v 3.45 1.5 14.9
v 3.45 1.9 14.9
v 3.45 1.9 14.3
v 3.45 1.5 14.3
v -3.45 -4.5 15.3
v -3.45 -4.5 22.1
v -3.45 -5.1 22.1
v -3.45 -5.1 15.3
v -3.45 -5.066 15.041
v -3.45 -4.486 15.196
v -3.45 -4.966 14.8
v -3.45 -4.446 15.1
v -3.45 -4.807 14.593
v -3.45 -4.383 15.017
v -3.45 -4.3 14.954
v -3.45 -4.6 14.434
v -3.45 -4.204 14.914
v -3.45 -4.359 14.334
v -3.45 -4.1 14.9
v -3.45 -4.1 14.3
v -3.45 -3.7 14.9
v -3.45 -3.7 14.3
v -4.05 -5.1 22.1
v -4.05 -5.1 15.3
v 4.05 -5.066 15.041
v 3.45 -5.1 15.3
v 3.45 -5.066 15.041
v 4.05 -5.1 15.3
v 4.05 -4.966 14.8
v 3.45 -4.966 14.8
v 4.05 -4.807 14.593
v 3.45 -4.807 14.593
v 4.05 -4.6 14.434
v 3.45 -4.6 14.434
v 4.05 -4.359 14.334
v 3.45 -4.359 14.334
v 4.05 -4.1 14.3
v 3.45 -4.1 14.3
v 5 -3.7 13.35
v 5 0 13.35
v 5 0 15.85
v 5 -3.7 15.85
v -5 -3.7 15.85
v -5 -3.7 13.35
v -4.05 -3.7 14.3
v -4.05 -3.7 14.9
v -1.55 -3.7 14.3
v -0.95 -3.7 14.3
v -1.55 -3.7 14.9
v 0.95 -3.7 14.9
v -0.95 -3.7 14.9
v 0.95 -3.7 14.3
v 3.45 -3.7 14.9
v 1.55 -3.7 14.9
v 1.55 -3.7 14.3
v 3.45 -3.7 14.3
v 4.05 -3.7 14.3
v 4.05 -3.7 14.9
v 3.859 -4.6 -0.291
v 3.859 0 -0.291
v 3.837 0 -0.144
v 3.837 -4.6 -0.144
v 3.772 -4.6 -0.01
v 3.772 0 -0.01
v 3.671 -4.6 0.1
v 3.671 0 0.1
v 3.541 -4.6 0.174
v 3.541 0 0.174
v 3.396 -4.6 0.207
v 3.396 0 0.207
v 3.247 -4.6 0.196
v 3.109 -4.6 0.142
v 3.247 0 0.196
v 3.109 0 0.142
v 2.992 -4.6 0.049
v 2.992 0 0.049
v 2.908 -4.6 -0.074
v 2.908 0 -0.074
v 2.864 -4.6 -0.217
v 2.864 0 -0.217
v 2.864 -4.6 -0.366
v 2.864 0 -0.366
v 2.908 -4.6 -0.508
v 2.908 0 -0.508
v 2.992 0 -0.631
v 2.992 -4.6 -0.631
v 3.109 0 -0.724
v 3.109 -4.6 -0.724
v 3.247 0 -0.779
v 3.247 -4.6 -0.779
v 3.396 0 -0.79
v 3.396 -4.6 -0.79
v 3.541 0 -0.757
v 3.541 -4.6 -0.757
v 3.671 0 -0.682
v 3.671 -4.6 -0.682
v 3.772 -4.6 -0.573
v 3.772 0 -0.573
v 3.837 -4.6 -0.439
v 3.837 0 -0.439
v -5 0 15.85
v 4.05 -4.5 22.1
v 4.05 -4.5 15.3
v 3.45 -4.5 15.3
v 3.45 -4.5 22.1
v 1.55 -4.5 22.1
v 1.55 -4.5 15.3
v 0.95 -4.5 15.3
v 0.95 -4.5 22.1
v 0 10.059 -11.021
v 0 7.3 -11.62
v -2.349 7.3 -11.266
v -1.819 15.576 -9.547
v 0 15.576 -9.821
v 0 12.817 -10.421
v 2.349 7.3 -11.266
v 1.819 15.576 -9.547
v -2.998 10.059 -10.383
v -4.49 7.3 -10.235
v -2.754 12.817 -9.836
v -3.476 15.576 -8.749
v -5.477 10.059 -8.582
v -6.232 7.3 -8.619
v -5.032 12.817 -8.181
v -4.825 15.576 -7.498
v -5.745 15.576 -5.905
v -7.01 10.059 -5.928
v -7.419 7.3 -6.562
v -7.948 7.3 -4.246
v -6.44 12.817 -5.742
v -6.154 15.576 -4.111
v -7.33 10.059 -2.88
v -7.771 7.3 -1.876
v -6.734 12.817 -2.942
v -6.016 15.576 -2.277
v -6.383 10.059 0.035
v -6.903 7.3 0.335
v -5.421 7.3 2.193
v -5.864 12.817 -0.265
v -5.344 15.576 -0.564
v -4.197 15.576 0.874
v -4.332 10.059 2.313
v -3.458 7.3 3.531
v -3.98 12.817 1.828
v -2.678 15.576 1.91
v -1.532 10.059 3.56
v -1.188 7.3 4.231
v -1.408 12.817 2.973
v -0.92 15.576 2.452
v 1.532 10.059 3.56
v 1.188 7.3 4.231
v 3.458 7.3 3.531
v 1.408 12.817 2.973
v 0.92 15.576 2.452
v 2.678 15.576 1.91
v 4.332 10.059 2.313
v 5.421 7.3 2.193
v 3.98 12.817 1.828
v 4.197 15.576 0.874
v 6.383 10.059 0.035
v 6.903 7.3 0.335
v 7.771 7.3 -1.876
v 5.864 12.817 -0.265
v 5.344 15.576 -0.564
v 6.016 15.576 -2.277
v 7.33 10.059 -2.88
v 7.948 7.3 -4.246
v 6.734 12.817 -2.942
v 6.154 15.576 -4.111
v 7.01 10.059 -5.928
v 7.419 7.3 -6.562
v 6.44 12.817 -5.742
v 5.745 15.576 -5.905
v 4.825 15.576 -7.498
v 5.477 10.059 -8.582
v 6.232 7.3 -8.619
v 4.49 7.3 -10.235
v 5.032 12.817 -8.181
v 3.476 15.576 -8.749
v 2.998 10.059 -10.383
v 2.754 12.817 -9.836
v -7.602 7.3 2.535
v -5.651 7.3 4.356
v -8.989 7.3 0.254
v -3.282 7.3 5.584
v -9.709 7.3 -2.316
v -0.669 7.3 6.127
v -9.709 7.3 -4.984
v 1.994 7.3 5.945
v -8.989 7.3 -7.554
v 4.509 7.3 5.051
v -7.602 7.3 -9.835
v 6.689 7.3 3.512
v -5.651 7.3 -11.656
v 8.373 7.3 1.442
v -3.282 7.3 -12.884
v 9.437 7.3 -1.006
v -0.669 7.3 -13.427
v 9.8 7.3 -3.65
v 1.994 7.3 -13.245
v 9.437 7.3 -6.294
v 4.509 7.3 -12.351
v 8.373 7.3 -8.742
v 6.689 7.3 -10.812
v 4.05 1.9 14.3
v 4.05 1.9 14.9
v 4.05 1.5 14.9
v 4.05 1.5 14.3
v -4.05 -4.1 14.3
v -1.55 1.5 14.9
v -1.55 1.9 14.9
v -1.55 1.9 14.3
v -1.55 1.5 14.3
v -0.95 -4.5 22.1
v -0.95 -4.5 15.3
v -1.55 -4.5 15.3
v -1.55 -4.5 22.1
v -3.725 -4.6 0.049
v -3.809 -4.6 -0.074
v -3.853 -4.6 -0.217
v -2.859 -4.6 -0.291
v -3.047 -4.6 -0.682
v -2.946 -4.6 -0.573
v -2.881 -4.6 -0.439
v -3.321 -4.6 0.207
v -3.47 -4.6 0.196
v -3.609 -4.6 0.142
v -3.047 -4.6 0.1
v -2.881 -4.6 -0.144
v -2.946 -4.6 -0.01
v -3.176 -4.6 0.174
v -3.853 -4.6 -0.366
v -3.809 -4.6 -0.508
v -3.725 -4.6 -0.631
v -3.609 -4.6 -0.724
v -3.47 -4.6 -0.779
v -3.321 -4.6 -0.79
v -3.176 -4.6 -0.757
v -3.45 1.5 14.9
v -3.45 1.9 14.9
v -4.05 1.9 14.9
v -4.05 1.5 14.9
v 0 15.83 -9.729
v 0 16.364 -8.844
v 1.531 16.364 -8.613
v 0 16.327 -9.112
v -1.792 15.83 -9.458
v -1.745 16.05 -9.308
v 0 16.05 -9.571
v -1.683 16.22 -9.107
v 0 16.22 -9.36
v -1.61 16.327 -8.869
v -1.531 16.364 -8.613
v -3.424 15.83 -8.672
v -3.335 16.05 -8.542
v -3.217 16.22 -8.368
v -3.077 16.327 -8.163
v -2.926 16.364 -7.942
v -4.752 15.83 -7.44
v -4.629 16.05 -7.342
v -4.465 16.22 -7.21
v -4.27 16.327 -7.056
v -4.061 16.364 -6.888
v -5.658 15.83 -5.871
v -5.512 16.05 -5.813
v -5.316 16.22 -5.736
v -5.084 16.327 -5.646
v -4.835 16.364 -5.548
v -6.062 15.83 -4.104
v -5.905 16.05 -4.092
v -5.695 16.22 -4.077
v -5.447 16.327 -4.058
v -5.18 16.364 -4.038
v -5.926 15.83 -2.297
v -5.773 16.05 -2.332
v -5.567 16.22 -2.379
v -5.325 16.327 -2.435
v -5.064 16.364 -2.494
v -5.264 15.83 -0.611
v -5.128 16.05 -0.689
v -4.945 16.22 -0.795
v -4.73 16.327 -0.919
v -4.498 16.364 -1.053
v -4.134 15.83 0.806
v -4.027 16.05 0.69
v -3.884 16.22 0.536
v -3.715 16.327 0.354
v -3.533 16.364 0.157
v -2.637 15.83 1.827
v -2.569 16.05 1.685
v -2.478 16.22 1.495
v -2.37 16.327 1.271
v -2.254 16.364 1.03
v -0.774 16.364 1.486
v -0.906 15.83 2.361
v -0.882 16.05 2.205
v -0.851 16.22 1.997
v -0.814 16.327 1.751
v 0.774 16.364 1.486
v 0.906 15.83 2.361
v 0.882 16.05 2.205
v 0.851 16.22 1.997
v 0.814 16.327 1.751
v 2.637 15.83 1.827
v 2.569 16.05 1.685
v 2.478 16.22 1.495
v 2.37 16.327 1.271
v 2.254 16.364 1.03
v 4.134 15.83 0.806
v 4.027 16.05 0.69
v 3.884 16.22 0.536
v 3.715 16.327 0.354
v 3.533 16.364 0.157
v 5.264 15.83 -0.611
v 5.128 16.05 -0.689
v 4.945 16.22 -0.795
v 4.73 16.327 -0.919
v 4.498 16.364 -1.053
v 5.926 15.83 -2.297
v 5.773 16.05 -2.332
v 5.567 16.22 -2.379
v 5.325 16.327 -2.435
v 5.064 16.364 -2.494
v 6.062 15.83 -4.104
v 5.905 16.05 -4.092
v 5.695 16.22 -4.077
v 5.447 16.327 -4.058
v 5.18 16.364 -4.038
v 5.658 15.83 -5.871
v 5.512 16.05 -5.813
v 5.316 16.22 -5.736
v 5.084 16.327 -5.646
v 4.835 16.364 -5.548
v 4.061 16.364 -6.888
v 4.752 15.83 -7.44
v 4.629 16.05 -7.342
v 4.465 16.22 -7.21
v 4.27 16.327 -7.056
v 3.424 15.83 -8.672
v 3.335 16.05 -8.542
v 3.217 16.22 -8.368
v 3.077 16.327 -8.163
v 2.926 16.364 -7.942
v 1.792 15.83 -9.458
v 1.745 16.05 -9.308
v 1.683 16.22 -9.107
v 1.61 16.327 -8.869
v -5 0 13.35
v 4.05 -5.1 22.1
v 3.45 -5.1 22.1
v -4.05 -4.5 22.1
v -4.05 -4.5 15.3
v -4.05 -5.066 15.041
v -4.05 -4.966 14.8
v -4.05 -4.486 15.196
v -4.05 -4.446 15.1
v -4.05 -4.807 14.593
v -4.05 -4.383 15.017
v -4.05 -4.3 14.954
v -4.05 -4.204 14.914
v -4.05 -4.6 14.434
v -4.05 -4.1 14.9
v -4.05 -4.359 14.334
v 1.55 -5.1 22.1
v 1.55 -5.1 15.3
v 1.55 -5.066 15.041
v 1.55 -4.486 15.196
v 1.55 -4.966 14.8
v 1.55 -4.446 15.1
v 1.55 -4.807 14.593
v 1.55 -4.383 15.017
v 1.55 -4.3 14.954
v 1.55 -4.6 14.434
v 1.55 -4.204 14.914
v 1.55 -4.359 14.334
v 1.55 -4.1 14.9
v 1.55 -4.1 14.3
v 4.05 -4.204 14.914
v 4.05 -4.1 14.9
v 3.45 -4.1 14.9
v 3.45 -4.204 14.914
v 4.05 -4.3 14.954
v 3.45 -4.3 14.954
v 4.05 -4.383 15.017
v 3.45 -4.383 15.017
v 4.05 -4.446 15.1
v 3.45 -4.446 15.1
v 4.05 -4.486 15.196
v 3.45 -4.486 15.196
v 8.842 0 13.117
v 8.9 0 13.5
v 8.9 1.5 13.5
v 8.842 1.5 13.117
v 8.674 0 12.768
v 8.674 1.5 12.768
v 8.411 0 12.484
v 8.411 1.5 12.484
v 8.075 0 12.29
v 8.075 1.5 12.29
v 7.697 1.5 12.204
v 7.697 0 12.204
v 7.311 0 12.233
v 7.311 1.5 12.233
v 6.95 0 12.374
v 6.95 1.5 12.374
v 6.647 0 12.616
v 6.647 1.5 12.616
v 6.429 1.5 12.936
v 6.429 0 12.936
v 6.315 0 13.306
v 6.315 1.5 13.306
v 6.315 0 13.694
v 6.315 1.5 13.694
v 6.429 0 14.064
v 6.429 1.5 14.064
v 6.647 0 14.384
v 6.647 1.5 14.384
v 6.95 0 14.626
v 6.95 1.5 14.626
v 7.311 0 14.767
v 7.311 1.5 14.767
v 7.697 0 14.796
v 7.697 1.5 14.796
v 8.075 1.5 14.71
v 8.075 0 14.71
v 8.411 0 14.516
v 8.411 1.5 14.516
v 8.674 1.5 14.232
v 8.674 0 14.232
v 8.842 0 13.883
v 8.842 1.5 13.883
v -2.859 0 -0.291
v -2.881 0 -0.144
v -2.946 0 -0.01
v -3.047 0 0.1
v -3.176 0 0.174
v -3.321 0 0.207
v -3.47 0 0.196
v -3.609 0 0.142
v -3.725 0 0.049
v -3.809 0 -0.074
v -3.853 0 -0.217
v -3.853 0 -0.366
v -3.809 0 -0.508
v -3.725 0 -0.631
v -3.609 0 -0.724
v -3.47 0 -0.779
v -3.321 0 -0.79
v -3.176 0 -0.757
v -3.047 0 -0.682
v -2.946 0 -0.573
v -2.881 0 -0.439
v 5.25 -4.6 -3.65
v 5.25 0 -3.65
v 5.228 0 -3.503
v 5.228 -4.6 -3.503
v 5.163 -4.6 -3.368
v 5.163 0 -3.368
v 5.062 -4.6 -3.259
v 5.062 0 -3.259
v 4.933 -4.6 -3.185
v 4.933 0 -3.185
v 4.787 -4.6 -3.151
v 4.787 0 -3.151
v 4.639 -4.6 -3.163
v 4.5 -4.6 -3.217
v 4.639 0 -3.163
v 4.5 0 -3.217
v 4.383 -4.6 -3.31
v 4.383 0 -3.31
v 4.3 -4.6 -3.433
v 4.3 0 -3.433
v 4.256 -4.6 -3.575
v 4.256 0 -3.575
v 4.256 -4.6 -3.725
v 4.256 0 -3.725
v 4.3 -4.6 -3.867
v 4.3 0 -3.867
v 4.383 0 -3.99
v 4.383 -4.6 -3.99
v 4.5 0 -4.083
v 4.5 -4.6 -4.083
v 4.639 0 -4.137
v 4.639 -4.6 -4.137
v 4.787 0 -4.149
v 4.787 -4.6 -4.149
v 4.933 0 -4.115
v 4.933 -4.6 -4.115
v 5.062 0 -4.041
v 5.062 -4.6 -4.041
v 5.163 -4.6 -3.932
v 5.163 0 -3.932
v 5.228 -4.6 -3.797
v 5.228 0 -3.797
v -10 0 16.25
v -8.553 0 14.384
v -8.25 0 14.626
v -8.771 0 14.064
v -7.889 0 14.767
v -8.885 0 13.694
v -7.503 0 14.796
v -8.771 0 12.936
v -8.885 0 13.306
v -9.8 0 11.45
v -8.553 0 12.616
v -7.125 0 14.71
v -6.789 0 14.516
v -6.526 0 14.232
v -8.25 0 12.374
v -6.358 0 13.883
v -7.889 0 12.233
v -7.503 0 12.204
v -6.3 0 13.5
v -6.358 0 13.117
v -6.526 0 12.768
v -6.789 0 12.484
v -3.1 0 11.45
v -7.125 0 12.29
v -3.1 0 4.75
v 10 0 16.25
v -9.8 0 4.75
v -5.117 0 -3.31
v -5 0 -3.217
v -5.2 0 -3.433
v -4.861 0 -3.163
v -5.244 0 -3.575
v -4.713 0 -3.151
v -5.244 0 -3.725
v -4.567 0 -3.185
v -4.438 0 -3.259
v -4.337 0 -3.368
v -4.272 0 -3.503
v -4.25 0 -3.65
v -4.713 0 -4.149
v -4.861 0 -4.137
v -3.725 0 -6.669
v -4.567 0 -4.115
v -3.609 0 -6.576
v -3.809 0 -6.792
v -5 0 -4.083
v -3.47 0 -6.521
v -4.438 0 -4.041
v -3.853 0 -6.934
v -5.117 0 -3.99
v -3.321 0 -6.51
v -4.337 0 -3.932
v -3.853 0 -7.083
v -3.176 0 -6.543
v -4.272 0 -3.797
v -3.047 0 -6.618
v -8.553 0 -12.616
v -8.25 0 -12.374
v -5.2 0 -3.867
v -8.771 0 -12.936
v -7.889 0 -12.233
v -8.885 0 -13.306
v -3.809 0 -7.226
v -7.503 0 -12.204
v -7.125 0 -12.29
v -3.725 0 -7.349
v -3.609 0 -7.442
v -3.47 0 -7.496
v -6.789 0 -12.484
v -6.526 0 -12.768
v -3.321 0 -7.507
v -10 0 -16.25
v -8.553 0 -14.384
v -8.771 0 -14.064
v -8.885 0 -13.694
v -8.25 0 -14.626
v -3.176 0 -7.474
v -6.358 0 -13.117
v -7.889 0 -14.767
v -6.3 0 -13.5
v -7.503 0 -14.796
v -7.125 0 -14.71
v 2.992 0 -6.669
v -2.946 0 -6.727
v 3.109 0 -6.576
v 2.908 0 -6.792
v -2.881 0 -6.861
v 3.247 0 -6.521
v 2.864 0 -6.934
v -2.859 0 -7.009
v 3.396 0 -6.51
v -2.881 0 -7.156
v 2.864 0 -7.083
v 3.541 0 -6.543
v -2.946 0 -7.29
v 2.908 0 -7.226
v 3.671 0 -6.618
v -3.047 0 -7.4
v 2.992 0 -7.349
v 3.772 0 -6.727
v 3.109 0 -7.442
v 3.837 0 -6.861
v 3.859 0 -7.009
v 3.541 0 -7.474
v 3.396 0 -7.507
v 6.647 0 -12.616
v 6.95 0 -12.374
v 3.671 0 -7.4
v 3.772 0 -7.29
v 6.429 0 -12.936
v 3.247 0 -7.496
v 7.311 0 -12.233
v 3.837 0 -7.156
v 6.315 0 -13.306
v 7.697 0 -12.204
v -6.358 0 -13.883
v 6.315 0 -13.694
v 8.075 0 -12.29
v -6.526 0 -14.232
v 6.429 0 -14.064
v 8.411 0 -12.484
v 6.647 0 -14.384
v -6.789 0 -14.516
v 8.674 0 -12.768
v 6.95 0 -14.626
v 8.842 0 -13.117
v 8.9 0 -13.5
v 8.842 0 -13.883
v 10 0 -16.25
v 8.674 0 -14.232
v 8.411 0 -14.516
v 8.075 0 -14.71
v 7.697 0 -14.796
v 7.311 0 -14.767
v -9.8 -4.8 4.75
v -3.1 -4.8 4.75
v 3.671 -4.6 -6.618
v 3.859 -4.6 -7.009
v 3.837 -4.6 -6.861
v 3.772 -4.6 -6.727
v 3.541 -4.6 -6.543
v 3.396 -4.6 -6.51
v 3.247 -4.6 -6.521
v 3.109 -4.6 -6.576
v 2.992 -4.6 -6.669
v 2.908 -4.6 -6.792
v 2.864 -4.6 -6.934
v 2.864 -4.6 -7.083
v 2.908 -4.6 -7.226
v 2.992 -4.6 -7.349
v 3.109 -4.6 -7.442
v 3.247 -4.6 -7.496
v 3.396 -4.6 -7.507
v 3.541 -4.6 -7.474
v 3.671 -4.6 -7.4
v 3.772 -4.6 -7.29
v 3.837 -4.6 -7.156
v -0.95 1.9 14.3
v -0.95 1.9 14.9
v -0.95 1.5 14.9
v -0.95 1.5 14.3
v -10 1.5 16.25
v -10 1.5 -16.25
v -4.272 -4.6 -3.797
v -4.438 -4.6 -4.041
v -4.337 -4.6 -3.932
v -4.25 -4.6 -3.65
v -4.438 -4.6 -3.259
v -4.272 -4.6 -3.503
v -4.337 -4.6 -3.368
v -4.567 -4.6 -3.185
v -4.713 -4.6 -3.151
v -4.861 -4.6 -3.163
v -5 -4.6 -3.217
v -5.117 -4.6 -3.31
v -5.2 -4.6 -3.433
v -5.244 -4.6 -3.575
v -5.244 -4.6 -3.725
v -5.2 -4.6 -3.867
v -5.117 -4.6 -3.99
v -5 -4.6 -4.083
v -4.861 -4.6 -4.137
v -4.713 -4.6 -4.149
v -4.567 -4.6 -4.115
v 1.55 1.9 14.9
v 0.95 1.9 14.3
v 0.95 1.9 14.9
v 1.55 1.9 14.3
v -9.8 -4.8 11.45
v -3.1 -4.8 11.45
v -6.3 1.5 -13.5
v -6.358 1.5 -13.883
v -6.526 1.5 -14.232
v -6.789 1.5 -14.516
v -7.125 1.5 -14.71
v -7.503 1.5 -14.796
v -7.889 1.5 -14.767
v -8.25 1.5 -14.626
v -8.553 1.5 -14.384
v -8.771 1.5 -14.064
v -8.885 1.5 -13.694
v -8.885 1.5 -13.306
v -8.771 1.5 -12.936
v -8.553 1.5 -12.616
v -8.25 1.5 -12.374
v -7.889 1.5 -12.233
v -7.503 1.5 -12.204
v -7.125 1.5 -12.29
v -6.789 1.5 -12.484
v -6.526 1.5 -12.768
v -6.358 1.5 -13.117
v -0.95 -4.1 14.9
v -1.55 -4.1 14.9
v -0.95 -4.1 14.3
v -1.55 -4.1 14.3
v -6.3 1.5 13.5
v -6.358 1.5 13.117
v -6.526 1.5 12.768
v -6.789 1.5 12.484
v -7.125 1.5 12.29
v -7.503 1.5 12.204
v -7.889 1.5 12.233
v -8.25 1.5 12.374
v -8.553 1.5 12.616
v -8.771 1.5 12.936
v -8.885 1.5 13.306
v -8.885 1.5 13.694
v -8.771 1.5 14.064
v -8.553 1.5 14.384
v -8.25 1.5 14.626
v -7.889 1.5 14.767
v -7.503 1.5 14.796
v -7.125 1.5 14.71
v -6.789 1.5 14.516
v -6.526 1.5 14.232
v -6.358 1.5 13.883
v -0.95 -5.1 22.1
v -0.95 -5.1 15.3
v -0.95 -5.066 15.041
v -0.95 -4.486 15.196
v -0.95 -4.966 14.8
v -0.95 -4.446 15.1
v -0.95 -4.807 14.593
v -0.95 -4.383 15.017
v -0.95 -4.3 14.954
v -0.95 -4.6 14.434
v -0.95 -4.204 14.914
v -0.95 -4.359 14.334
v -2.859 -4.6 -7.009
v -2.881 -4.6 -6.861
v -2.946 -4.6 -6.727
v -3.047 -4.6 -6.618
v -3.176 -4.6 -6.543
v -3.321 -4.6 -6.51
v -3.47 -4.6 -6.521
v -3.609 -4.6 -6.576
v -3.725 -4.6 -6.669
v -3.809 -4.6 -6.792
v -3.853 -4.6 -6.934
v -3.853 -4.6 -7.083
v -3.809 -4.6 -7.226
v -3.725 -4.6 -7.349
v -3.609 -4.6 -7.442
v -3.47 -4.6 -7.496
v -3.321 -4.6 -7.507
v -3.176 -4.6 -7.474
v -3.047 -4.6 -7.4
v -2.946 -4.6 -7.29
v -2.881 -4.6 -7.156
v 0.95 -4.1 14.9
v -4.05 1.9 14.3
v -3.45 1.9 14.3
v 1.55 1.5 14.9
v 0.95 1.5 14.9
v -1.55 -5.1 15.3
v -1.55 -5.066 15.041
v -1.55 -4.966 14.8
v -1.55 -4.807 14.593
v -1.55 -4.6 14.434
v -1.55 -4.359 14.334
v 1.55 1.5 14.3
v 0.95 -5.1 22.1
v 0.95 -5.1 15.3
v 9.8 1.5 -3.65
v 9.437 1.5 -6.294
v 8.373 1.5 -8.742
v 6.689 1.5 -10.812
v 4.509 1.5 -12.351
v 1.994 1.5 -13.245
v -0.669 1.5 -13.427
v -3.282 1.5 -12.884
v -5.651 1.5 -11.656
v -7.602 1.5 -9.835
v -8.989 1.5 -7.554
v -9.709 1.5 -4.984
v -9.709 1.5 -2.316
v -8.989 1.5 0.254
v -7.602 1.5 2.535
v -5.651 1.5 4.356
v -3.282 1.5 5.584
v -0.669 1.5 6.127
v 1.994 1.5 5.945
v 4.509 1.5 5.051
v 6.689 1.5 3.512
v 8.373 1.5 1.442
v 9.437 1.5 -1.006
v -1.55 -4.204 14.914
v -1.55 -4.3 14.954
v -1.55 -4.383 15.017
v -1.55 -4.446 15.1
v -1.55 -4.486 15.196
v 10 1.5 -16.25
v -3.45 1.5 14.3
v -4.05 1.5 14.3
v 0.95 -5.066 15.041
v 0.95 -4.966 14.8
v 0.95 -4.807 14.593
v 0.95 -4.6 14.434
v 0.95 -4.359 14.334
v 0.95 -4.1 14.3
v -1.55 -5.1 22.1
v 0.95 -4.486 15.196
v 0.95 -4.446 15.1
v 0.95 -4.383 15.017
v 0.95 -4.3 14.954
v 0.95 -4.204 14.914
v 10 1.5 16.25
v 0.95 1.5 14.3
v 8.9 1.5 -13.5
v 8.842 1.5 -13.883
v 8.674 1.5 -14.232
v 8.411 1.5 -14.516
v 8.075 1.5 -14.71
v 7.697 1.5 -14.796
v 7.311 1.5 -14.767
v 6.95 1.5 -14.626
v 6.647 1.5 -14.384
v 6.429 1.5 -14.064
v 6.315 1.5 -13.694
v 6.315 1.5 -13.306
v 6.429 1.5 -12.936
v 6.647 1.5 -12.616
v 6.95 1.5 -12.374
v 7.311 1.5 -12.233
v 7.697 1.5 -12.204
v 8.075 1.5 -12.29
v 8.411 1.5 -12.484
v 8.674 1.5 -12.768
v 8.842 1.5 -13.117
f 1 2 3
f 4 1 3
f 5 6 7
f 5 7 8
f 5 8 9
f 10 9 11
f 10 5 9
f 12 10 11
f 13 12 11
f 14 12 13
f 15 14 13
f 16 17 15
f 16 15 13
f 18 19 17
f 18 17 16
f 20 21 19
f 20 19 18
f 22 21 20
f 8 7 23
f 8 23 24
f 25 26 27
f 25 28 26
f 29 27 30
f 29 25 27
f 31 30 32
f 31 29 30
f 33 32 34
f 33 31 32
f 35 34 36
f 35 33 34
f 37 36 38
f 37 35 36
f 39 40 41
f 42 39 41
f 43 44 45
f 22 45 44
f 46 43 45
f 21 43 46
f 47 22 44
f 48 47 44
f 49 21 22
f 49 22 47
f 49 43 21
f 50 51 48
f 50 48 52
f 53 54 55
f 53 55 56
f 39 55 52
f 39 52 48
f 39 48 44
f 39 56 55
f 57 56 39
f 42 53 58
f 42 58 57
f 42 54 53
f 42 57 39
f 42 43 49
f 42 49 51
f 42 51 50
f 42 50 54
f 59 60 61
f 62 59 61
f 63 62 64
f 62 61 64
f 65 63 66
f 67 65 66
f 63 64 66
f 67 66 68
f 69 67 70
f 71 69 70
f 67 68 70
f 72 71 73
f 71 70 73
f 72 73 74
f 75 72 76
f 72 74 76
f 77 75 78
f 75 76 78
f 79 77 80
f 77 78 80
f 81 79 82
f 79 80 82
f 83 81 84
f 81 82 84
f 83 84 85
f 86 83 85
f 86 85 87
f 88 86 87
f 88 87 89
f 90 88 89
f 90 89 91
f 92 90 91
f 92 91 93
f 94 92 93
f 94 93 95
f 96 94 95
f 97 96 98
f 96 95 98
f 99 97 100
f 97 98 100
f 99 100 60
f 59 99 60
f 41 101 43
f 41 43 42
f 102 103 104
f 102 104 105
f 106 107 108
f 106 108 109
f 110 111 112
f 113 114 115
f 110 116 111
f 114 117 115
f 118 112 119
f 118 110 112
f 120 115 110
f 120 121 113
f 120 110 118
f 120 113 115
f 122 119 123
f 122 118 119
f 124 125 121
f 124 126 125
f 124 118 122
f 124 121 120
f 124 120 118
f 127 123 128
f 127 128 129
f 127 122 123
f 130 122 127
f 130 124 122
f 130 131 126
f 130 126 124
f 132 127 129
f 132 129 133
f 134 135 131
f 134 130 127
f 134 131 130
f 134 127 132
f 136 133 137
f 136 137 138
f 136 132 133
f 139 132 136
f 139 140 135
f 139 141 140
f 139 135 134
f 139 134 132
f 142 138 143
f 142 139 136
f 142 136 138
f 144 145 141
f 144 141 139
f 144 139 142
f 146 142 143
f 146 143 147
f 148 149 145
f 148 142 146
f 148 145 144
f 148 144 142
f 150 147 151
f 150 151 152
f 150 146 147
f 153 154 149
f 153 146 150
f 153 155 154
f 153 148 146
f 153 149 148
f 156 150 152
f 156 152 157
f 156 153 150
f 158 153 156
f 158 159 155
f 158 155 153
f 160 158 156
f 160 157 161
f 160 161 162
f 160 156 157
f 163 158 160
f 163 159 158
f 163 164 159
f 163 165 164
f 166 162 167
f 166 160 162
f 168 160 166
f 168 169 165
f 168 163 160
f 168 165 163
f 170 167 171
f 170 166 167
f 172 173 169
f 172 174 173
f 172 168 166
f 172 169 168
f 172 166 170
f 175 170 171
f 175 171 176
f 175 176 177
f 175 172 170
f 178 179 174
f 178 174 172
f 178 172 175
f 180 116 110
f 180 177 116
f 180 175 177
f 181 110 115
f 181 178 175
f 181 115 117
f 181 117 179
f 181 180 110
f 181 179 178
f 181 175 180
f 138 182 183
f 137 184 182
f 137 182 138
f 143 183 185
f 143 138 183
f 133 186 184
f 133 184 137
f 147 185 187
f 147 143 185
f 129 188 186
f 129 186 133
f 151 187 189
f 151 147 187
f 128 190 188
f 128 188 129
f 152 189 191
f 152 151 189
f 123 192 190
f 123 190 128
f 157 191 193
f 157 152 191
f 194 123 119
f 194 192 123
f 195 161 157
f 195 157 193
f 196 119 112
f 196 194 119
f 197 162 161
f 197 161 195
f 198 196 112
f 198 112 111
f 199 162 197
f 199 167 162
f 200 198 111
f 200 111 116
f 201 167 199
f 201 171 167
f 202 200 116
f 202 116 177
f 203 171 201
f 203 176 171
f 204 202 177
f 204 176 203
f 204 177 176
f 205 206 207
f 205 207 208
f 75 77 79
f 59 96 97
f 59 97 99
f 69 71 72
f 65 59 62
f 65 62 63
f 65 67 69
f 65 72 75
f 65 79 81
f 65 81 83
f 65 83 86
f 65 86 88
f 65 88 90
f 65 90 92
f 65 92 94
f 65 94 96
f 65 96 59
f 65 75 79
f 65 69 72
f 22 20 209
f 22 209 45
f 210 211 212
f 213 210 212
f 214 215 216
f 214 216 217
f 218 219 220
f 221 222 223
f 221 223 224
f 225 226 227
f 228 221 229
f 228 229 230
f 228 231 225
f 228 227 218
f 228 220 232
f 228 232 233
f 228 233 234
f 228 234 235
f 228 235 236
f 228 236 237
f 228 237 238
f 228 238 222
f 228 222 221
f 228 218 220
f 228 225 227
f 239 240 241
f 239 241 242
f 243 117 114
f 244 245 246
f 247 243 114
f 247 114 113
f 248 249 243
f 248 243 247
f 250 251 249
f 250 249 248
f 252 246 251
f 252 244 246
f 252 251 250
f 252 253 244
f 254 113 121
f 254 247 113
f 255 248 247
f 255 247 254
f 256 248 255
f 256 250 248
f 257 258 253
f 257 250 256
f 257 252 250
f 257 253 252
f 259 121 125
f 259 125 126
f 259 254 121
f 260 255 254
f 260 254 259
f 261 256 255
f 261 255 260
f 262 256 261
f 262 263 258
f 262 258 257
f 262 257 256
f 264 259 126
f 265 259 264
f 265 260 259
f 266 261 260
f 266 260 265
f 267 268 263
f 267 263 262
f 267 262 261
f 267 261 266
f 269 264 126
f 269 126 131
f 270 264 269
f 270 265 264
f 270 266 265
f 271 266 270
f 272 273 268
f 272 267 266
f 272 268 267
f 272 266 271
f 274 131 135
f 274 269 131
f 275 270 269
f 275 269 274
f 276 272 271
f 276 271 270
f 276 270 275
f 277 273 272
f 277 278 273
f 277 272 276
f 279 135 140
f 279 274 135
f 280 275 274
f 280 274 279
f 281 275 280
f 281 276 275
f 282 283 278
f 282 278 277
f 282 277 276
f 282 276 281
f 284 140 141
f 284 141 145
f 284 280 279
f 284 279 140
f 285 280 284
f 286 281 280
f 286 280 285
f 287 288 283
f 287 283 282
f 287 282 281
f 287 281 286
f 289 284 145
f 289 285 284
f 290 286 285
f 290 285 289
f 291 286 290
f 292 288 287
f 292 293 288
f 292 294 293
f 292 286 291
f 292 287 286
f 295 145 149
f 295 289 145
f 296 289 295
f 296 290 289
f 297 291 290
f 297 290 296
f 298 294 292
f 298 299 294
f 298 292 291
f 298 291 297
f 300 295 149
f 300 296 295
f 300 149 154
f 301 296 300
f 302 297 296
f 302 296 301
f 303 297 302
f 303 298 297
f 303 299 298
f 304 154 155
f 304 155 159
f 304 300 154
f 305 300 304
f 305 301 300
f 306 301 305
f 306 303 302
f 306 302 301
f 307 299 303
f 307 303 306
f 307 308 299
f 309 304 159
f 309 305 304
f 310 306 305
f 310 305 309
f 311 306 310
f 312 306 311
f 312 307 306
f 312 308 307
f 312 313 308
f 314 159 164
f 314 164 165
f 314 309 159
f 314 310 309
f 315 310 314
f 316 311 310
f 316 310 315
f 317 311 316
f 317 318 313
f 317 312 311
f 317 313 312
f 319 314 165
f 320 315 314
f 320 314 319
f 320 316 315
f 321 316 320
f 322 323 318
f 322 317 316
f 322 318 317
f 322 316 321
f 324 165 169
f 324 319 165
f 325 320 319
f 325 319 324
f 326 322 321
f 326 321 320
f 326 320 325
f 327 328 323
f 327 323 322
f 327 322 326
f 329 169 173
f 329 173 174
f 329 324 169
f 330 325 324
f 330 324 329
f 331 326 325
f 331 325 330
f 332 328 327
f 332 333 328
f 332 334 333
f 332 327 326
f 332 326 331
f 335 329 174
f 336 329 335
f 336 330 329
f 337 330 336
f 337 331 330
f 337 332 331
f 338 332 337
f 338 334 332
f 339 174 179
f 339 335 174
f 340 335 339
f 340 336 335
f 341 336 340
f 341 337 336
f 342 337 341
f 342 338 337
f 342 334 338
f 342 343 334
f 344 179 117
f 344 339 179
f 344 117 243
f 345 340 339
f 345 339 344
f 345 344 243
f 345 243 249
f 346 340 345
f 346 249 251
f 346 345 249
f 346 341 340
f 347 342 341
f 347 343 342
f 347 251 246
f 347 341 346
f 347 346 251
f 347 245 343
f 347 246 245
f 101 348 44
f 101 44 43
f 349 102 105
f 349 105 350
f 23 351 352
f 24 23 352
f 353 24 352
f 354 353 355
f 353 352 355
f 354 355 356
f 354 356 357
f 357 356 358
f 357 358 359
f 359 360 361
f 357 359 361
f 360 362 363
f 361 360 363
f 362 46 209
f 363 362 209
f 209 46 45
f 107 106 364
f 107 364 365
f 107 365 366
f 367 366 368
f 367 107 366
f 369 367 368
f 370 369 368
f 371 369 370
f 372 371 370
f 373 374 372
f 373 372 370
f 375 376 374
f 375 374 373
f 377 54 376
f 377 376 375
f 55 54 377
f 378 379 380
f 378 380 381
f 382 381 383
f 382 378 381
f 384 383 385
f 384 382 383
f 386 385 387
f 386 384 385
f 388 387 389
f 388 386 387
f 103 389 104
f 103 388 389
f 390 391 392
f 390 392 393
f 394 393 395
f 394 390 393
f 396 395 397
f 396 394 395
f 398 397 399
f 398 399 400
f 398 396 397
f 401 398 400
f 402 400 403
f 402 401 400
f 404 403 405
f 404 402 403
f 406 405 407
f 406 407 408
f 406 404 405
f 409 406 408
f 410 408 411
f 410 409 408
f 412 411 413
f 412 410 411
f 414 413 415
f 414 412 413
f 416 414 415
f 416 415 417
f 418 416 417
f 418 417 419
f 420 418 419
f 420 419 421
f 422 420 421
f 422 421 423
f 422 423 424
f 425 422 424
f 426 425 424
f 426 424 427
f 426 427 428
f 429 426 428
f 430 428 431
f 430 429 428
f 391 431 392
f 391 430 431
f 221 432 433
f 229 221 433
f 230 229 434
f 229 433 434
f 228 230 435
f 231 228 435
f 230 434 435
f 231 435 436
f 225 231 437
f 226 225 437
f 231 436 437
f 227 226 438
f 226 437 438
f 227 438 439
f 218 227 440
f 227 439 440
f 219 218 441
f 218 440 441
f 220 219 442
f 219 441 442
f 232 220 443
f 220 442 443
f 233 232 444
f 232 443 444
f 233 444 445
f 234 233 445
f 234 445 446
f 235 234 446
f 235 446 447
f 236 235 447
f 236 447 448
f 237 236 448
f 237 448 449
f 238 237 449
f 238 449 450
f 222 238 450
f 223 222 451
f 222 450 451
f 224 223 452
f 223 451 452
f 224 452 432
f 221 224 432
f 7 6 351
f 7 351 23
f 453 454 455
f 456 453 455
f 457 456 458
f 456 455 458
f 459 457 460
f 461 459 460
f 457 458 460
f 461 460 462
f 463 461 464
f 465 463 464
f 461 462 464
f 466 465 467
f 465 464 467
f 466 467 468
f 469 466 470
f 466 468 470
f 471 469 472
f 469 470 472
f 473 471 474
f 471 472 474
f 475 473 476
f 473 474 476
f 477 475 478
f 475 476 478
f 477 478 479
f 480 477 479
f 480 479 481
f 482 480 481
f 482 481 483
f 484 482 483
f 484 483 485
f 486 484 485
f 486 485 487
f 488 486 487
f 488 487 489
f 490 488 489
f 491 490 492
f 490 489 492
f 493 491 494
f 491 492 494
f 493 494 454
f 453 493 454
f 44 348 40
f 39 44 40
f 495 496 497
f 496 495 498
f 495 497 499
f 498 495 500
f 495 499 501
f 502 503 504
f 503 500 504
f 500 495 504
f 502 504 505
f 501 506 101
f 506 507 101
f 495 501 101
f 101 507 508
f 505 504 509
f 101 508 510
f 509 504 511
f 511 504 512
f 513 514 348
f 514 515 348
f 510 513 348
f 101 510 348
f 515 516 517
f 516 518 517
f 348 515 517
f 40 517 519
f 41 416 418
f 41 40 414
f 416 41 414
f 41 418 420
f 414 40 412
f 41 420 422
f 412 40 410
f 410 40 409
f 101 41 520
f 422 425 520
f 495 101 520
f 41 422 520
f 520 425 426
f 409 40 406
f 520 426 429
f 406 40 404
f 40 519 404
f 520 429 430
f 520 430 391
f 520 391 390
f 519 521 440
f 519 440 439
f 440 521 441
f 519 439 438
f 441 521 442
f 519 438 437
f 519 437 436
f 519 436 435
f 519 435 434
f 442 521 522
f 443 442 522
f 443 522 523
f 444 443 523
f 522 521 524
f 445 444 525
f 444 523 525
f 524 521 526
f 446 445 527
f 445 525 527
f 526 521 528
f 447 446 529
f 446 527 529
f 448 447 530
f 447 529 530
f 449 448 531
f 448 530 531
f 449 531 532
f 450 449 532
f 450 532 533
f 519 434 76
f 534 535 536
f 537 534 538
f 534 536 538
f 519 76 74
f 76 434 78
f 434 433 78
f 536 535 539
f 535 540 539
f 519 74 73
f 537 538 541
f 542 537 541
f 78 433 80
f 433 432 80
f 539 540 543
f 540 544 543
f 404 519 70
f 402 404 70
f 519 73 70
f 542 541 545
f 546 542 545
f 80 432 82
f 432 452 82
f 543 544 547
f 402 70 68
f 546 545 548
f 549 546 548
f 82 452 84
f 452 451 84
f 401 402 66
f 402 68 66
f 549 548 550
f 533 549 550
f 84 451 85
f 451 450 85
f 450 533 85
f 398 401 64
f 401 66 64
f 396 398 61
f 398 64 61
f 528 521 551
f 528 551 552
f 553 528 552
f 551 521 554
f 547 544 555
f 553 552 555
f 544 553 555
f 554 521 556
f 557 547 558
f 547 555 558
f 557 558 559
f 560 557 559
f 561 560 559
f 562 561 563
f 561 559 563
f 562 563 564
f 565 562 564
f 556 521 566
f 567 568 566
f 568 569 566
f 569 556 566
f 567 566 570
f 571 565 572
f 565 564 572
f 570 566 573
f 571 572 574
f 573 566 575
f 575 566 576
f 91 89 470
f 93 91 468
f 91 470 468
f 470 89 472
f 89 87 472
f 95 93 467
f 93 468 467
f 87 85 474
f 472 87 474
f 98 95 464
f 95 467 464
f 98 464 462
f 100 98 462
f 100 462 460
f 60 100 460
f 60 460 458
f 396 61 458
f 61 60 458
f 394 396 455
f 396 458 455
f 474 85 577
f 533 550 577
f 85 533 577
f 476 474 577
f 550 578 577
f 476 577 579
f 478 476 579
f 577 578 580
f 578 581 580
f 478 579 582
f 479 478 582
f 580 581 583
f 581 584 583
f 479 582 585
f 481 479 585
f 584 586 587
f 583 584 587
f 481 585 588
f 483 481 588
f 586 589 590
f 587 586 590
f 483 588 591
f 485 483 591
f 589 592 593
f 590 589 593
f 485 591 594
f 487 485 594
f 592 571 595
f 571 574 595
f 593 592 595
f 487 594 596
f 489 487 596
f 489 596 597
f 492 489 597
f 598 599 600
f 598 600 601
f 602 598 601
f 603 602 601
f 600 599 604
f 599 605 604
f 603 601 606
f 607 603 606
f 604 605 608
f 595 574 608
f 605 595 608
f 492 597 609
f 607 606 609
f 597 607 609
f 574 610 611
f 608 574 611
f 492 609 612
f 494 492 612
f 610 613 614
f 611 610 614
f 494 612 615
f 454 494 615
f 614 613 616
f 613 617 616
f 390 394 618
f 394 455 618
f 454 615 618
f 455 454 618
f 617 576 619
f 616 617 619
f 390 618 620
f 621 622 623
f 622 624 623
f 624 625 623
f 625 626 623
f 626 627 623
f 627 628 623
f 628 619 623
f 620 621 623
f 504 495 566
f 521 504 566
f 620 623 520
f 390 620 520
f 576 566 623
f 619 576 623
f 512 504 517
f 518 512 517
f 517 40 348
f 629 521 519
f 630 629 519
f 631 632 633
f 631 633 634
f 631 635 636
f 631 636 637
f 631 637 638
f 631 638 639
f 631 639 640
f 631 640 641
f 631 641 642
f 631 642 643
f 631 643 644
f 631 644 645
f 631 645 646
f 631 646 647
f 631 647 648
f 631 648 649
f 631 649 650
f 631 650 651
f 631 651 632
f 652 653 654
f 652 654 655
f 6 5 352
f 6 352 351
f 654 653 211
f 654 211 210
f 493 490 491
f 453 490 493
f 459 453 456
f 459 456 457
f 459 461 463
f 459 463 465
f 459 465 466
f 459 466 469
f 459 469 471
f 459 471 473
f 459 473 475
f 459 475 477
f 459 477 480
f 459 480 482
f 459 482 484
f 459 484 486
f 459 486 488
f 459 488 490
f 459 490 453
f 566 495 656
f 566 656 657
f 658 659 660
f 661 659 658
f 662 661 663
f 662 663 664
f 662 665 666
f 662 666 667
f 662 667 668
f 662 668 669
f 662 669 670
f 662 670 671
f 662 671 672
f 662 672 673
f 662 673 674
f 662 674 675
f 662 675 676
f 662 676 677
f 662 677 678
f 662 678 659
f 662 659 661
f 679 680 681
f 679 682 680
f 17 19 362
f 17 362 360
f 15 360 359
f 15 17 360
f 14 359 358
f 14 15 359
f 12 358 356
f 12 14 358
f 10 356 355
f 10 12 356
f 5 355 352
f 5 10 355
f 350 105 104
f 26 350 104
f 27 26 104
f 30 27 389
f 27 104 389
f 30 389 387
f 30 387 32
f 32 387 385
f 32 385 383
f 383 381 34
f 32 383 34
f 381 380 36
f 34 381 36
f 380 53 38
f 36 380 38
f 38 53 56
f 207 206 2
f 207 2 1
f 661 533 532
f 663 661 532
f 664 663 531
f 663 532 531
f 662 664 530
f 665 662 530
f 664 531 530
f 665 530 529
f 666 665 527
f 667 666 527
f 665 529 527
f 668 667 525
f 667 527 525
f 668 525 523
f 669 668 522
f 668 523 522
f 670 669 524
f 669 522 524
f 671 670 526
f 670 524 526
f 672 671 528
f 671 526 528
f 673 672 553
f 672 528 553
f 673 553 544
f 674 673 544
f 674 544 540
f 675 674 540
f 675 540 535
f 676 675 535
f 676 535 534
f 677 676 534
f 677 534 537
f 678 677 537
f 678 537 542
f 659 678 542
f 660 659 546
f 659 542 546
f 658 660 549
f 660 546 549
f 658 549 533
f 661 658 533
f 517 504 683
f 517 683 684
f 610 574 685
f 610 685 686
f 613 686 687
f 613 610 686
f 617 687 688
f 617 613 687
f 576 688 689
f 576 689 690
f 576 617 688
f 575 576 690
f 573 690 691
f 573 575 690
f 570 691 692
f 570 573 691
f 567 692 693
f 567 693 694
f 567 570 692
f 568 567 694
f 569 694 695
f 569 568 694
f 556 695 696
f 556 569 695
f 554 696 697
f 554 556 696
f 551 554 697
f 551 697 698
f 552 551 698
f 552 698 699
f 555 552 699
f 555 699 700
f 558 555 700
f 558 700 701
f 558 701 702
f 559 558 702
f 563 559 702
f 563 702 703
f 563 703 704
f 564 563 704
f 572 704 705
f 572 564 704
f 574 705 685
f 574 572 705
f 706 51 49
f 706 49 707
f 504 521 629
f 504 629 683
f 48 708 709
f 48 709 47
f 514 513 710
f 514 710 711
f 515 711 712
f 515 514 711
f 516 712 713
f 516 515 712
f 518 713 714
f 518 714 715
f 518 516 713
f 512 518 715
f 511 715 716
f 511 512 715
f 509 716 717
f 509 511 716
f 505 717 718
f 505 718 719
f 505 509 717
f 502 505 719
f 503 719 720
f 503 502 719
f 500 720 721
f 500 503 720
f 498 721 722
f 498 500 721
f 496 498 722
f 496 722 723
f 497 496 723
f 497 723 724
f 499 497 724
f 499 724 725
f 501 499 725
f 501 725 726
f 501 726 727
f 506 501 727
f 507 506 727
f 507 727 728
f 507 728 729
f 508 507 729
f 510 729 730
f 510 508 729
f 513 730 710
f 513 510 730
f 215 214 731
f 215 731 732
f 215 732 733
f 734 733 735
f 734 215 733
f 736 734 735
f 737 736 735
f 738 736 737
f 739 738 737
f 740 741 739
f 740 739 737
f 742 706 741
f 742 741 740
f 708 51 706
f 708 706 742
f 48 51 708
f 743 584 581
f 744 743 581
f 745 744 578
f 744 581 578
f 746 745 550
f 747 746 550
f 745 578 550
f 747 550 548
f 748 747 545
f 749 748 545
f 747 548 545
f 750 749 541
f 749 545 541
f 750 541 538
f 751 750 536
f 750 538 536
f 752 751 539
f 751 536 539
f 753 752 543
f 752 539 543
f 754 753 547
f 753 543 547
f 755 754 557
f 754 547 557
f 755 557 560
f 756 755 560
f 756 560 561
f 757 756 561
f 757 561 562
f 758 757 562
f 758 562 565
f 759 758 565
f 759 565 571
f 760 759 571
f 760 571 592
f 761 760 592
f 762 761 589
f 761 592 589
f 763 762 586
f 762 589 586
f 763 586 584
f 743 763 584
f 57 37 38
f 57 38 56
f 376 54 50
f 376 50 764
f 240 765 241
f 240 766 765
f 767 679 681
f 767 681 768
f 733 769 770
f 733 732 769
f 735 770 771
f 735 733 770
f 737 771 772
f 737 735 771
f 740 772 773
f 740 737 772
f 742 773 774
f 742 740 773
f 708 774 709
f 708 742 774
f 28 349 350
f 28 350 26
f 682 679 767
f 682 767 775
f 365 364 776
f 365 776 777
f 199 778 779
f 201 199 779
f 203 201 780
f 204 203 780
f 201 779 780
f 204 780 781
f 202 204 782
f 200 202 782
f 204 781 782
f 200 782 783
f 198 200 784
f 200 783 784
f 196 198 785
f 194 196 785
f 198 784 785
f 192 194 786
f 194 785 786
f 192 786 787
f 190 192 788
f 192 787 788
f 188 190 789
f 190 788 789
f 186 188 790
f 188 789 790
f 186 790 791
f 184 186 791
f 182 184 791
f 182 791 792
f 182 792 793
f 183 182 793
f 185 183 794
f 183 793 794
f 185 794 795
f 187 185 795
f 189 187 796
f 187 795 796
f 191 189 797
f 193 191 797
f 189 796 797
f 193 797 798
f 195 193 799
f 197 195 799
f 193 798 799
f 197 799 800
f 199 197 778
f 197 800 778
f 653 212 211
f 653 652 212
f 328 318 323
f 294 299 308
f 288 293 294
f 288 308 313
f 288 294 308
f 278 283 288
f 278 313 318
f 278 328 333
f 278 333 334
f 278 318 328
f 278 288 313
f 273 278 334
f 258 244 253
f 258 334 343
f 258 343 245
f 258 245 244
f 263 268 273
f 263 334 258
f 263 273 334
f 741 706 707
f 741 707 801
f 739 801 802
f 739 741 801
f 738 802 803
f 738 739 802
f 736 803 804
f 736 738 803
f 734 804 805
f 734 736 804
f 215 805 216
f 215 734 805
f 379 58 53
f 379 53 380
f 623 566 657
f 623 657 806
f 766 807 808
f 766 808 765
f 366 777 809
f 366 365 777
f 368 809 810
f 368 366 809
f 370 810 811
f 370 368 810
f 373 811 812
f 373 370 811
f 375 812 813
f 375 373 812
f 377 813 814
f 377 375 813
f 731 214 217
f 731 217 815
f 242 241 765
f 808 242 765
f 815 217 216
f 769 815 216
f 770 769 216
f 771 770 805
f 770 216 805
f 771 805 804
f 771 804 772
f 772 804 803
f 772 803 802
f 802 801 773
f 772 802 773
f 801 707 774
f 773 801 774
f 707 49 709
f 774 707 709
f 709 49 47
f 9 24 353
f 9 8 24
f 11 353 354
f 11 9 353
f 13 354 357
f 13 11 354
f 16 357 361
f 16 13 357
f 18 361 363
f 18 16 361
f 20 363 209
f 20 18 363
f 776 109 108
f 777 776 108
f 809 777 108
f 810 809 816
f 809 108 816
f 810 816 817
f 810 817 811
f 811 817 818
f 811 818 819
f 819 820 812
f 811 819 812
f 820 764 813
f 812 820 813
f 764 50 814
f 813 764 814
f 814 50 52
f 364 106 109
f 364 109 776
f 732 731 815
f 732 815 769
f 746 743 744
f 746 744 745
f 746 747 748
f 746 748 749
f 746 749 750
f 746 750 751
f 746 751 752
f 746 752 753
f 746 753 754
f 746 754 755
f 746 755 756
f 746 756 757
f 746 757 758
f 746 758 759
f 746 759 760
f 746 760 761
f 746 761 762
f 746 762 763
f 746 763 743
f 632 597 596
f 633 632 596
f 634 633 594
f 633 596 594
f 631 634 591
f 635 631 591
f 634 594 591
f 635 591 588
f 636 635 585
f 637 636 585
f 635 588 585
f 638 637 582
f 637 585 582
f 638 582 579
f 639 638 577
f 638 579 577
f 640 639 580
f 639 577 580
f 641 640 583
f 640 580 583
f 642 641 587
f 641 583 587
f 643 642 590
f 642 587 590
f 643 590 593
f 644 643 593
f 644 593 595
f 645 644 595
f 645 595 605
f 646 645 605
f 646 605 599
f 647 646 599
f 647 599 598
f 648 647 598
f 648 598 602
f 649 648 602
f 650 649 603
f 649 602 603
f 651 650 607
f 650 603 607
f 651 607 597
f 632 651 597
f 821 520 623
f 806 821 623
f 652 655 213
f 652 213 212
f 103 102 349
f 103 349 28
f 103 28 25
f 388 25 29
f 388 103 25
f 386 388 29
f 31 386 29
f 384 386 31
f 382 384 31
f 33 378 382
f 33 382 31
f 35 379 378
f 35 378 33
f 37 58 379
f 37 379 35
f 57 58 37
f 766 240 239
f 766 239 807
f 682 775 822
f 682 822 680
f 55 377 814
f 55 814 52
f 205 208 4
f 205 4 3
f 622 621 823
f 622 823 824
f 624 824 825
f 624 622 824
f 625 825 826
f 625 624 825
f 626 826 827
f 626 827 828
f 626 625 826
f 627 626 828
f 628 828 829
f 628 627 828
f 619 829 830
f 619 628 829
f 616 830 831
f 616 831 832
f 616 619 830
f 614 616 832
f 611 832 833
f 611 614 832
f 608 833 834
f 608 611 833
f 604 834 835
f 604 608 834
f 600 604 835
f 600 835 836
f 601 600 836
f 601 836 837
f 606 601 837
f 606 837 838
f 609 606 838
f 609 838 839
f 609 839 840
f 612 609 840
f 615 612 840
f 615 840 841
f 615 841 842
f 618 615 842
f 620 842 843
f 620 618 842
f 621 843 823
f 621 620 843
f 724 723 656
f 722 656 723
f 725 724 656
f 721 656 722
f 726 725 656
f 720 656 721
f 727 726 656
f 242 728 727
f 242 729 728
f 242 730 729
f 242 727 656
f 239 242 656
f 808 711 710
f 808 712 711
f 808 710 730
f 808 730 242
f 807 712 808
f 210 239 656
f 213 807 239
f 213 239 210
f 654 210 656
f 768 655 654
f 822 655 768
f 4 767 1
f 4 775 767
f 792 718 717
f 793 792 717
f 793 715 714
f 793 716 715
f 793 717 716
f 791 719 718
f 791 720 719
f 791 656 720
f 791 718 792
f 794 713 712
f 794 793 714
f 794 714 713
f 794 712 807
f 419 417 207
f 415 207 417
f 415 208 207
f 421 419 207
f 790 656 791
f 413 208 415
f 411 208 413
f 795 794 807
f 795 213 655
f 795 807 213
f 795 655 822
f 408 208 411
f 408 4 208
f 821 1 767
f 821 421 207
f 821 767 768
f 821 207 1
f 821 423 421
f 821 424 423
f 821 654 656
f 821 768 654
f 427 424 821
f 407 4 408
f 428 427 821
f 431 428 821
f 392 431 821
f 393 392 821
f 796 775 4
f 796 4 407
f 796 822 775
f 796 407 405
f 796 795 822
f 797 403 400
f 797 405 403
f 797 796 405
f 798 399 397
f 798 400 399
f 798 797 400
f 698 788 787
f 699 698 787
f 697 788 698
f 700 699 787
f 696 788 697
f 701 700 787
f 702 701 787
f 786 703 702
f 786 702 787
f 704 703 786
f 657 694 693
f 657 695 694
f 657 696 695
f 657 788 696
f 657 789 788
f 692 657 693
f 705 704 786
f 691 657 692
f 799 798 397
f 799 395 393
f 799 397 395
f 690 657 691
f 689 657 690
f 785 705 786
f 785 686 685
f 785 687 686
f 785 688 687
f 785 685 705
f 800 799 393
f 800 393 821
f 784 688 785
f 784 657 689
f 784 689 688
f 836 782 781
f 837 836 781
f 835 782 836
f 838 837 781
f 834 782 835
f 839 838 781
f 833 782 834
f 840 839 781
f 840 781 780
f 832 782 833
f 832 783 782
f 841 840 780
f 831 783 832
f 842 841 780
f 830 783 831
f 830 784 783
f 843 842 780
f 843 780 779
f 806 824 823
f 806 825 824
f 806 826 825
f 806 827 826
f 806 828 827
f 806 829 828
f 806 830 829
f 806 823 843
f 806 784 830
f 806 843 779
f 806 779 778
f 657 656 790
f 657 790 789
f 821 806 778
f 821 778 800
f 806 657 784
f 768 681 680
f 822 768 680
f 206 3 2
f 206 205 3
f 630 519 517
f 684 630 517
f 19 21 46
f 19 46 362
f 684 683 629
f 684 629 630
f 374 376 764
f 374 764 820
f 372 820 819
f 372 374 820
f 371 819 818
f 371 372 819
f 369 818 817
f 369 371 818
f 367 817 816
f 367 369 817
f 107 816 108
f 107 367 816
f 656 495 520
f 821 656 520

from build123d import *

# Parameters (mm, degrees)
SKETCH_1_W                 = 20
SKETCH_1_H                 = 32.5
SKETCH_1_R                 = 1.3
EXTRUDE_1_DEPTH            = 1.5
SKETCH_2_R                 = 9.8
EXTRUDE_2_DEPTH            = 5.8
FILLET_1_R                 = 1
SKETCH_4_W                 = 6.7
SKETCH_4_H                 = 6.7
EXTRUDE_3_DEPTH            = 4.8
SKETCH_5_R                 = 0.5
EXTRUDE_4_DEPTH            = 4.6
SKETCH_6_W                 = 2.5
SKETCH_6_H                 = 2.5
EXTRUDE_5_DEPTH            = 3.7
EXTRUDE_6_DEPTH            = 0.3
PATTERN_LINEAR_1_COUNT     = 3
PATTERN_LINEAR_1_PITCH     = 2.5
PATTERN_LINEAR_1_COL_COUNT = 2
PATTERN_LINEAR_1_COL_PITCH = 2.5


with BuildPart() as part:
    # 草图1 → 凸台-拉伸1 (new body)
    with BuildSketch(Plane(origin=(0, 0, 0), x_dir=(1, 0, 0), z_dir=(0, 1, 0))):
        Rectangle(SKETCH_1_W, SKETCH_1_H)
        with Locations((7.6, 13.5)):
            Circle(SKETCH_1_R, mode=Mode.SUBTRACT)
        with Locations((-7.6, 13.5)):
            Circle(SKETCH_1_R, mode=Mode.SUBTRACT)
        with Locations((-7.6, -13.5)):
            Circle(SKETCH_1_R, mode=Mode.SUBTRACT)
        with Locations((7.6, -13.5)):
            Circle(SKETCH_1_R, mode=Mode.SUBTRACT)
    extrude(amount=EXTRUDE_1_DEPTH)

    # 草图2 → 凸台-拉伸2 (add)
    with BuildSketch(Plane(origin=(0, 1.5, 0), x_dir=(1, 0, 0), z_dir=(0, 1, 0))):
        with Locations((0, 3.65)):
            Circle(SKETCH_2_R)
    extrude(amount=EXTRUDE_2_DEPTH)

    # 草图3 → 旋转1 (revolve)
    with BuildSketch(Plane(origin=(0, 0, 0), x_dir=(0, 0, -1), z_dir=(1, 0, 0))):
        Polygon((3.65, 7.163786099), (11.65, 7.163786099), (9.65, 16.363786099), (3.65, 16.363786099), align=None)
    revolve(axis=Axis((0, 2.048350332, -3.65), (0, 1, 0)))

    # 圆角1
    fillet_1_edges = [part.edges().sort_by_distance(p)[0] for p in [
        (0, 16.363786099, 2.35),
    ]]
    fillet(fillet_1_edges, radius=FILLET_1_R)

    # 草图4 → 凸台-拉伸3 (add)
    with BuildSketch(Plane.XZ):
        with Locations((-6.45, 8.1)):
            Rectangle(SKETCH_4_W, SKETCH_4_H)
    extrude(amount=EXTRUDE_3_DEPTH)

    # 草图5 → 凸台-拉伸4 (add)
    with BuildSketch(Plane.XZ):
        with Locations((4.75, -3.65)):
            Circle(SKETCH_5_R)
        with Locations((3.358757211, -7.008757211)):
            Circle(SKETCH_5_R)
        with Locations((-3.358757211, -7.008757211)):
            Circle(SKETCH_5_R)
        with Locations((-4.75, -3.65)):
            Circle(SKETCH_5_R)
        with Locations((-3.358757211, -0.291242789)):
            Circle(SKETCH_5_R)
        with Locations((3.358757211, -0.291242789)):
            Circle(SKETCH_5_R)
    extrude(amount=EXTRUDE_4_DEPTH)

    # 草图6 → 凸台-拉伸5 (add)
    with BuildSketch(Plane.XZ):
        with Locations((1.25, 14.6)):
            Rectangle(SKETCH_6_W, SKETCH_6_H)
    extrude_5 = extrude(amount=EXTRUDE_5_DEPTH)

    # 草图7 → 凸台-拉伸6 (add, symmetric)
    with BuildSketch(Plane(origin=(1.25, 0, 0), x_dir=(0, 0, -1), z_dir=(1, 0, 0))):
        with BuildLine():
            Line((-14.3, 1.9), (-14.9, 1.9))
            Line((-14.9, 1.9), (-14.9, -4.1))
            ThreePointArc((-14.9, -4.1), (-15.017157288, -4.382842712), (-15.3, -4.5))
            Line((-15.3, -4.5), (-22.1, -4.5))
            Line((-22.1, -4.5), (-22.1, -5.1))
            Line((-22.1, -5.1), (-15.3, -5.1))
            ThreePointArc((-15.3, -5.1), (-14.592893219, -4.807106781), (-14.3, -4.1))
            Line((-14.3, -4.1), (-14.3, 1.9))
        make_face()
    extrude_6 = extrude(amount=EXTRUDE_6_DEPTH, both=True)

    # 阵列(线性)1: 凸台-拉伸5, 凸台-拉伸6 ×3
    with Locations(*[(-i * PATTERN_LINEAR_1_PITCH, 0, 0) for i in range(1, PATTERN_LINEAR_1_COUNT)]):
        add(extrude_5)
        add(extrude_6)

    # 阵列(线性)1 col: 凸台-拉伸5, 凸台-拉伸6 ×2
    with Locations(*[(i * PATTERN_LINEAR_1_COL_PITCH, 0, 0) for i in range(1, PATTERN_LINEAR_1_COL_COUNT)]):
        add(extrude_5)
        add(extrude_6)


solid = part.part
